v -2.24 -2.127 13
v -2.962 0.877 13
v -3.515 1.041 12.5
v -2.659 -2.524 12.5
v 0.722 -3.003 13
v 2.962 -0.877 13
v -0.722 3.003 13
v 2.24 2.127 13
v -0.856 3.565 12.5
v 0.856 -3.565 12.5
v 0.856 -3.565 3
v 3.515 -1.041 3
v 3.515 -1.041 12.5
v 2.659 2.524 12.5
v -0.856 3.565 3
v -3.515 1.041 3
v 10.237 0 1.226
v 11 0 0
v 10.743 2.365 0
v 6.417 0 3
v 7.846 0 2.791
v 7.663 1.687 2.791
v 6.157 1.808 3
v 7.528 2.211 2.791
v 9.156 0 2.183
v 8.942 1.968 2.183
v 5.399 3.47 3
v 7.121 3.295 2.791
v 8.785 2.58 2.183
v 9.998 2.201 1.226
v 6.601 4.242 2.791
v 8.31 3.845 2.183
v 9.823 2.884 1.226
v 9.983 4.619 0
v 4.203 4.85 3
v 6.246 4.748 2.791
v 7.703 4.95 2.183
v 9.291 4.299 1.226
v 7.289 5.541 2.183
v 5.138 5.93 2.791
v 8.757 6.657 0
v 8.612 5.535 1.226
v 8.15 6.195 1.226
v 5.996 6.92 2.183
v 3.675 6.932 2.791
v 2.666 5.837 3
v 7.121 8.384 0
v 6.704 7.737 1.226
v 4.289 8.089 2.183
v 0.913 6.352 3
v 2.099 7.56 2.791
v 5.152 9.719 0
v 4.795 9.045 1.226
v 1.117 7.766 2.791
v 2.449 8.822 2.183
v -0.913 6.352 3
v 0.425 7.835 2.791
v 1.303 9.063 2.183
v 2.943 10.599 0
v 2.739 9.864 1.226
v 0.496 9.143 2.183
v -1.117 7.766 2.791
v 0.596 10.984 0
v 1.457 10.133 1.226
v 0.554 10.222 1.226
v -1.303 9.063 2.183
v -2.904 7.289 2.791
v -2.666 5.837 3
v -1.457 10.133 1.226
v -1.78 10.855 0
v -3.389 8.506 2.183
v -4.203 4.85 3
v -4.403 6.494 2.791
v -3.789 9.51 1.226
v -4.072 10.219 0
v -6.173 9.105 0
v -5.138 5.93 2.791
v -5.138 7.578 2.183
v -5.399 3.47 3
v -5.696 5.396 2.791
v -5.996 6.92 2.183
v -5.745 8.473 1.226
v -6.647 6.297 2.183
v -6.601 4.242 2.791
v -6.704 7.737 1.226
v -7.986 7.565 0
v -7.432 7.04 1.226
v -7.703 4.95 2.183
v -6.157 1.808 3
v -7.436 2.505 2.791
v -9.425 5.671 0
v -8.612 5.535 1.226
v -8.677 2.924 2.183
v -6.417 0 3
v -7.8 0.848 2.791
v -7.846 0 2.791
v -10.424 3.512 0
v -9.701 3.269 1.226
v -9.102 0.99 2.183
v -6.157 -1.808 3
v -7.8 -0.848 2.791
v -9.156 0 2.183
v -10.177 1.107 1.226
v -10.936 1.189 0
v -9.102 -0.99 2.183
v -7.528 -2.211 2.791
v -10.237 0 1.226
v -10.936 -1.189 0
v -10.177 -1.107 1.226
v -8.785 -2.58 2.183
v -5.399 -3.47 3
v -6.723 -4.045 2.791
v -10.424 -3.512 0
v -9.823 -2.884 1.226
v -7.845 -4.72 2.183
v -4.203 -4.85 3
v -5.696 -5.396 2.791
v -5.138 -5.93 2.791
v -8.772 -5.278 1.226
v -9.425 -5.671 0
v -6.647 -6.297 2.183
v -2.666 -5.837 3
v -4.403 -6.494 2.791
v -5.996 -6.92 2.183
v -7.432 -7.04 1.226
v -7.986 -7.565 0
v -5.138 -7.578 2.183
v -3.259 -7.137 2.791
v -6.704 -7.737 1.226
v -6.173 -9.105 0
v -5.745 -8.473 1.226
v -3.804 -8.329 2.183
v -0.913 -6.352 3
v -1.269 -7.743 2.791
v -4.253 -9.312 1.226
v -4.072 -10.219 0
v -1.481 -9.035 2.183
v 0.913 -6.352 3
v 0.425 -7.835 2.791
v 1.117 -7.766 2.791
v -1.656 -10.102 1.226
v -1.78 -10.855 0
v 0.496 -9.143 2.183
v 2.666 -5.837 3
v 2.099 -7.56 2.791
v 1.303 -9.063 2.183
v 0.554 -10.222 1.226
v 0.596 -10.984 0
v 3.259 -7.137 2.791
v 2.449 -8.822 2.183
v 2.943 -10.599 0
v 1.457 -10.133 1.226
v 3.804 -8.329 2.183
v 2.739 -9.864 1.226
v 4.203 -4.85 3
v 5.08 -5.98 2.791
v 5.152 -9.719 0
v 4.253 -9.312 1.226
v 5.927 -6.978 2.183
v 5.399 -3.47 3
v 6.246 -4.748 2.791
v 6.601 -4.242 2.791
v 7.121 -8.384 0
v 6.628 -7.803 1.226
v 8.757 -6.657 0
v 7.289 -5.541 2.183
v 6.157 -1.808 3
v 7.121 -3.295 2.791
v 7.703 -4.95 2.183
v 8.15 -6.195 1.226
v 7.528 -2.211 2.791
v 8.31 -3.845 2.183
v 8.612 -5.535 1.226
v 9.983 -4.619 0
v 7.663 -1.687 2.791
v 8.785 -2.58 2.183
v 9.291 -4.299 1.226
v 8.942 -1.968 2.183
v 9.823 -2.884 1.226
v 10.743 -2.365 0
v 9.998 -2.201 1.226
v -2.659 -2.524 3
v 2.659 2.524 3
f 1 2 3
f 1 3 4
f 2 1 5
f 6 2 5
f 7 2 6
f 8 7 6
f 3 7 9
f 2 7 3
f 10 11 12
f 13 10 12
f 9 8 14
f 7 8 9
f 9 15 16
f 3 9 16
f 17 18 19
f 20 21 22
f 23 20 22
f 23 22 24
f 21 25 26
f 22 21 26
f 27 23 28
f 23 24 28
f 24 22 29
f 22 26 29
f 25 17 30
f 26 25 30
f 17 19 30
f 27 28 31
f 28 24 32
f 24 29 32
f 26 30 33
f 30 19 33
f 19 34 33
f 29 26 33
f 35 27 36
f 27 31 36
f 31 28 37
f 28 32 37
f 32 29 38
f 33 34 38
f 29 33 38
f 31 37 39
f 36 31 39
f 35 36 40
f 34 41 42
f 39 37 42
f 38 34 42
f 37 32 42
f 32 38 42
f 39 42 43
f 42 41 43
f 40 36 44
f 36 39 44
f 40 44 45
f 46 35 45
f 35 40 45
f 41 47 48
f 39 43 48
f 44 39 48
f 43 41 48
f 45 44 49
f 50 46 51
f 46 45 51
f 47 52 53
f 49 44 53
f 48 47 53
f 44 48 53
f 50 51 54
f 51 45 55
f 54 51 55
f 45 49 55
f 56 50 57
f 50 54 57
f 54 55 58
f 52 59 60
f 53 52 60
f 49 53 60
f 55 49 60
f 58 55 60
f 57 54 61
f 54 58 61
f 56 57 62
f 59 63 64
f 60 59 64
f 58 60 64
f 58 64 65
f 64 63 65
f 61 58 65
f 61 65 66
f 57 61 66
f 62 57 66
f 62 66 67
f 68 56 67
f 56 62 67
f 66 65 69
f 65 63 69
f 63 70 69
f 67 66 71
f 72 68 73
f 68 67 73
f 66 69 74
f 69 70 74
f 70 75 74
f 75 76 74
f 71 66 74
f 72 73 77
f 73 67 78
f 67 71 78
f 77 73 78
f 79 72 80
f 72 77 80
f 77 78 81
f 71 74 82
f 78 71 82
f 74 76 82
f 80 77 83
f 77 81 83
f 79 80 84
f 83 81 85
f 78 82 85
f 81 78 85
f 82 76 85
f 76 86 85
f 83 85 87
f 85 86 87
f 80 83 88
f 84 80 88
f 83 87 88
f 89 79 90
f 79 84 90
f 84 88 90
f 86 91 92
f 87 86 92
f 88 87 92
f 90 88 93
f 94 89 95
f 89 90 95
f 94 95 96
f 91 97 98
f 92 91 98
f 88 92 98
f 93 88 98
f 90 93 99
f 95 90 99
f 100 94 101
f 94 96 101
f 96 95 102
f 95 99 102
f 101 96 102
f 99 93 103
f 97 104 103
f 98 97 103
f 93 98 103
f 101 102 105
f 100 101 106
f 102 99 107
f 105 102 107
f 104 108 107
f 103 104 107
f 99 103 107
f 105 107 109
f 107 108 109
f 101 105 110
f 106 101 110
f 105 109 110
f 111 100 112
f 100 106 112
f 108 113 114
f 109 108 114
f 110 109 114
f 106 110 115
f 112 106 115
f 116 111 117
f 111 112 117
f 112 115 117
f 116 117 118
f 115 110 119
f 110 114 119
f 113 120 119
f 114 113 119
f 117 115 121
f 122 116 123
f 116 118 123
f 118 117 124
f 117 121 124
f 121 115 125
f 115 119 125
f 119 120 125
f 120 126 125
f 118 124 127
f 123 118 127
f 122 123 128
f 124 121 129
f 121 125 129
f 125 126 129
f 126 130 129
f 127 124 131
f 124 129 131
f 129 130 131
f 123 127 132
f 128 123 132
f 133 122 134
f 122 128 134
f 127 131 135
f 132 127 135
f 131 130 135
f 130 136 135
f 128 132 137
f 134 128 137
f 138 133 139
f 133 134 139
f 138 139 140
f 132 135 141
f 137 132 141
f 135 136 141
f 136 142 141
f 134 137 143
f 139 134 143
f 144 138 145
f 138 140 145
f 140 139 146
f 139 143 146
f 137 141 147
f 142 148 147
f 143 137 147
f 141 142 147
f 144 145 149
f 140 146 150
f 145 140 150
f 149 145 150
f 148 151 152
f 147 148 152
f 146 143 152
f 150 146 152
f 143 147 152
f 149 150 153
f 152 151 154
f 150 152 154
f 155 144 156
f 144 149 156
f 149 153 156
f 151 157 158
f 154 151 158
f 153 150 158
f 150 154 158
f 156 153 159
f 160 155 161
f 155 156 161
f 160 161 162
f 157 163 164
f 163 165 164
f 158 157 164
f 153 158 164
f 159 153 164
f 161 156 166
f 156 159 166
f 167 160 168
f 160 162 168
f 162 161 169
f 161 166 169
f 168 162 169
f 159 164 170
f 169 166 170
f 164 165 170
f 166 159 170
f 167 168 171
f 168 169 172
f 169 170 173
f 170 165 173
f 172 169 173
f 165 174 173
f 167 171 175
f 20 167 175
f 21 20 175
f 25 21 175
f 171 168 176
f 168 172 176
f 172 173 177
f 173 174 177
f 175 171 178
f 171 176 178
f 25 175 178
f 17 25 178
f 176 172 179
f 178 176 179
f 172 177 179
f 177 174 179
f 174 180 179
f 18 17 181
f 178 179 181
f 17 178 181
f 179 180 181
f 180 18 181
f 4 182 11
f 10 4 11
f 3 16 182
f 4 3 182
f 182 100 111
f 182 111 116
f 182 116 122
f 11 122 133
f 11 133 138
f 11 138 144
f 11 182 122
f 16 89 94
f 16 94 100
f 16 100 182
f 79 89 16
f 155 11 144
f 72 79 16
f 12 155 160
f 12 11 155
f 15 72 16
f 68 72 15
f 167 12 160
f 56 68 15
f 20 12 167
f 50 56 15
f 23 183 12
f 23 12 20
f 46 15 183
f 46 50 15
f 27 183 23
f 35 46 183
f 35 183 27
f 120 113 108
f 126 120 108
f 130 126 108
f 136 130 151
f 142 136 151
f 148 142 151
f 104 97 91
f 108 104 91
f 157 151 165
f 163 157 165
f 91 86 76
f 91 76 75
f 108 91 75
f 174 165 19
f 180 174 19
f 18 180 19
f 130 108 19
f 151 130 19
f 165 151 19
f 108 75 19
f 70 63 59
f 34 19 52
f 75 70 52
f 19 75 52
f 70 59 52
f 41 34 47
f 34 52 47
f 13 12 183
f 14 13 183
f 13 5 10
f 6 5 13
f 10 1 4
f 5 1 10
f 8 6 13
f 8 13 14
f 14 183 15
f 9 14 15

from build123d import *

# Parameters (mm, degrees)
F0_R     = 11
F1_DEPTH = 3
F3_DEPTH = 10
F4_SIZE  = 0.5


# Not quite as in the source:
# - a fillet or chamfer that OpenCascade refuses, or shapes differently, is made with other operations: its cross-section is extruded or revolved along the edge and cut away or added


with BuildPart() as f1:
    # F0 (on Top) → F1 (new body)
    with BuildSketch(Plane.XY):
        Circle(F0_R)
    extrude(amount=F1_DEPTH)

    # F2 (on face) → F3 (join)
    with BuildSketch(Plane.XY.offset(3)):
        Polygon((0.8564302523, -3.5647384976), (3.5153692229, -1.0406788937), (2.6589389706, 2.5240596039), (-0.8564302523, 3.5647384976), (-3.5153692229, 1.0406788937), (-2.6589389706, -2.5240596039), align=None)
    extrude(amount=F3_DEPTH)

    # F4
    f4_edges = [f1.edges().sort_by_distance(p)[0] for p in [
        (2.1859, -2.302709, 13),
        (3.087154, 0.74169, 13),
        (0.901254, 3.044399, 13),
        (-2.1859, 2.302709, 13),
        (-3.087154, -0.74169, 13),
        (-0.901254, -3.044399, 13),
    ]]
    chamfer(f4_edges, length=F4_SIZE)

    # F5: fillet of radius 5 on 1 edges, made by hand

    # F5_s1 → F5_t2 (revolve, cut)
    with BuildSketch(Plane.XZ):
        with BuildLine():
            ThreePointArc((6.417424305, 3), (9.1560370926, 2.1833001327), (11, 0))
            Line((11, 0), (11, 3))
            Line((11, 3), (6.417424305, 3))
        make_face()
    revolve(axis=Axis((0, 0, 3), (0, 0, 1)), mode=Mode.SUBTRACT)


solid = f1.part
